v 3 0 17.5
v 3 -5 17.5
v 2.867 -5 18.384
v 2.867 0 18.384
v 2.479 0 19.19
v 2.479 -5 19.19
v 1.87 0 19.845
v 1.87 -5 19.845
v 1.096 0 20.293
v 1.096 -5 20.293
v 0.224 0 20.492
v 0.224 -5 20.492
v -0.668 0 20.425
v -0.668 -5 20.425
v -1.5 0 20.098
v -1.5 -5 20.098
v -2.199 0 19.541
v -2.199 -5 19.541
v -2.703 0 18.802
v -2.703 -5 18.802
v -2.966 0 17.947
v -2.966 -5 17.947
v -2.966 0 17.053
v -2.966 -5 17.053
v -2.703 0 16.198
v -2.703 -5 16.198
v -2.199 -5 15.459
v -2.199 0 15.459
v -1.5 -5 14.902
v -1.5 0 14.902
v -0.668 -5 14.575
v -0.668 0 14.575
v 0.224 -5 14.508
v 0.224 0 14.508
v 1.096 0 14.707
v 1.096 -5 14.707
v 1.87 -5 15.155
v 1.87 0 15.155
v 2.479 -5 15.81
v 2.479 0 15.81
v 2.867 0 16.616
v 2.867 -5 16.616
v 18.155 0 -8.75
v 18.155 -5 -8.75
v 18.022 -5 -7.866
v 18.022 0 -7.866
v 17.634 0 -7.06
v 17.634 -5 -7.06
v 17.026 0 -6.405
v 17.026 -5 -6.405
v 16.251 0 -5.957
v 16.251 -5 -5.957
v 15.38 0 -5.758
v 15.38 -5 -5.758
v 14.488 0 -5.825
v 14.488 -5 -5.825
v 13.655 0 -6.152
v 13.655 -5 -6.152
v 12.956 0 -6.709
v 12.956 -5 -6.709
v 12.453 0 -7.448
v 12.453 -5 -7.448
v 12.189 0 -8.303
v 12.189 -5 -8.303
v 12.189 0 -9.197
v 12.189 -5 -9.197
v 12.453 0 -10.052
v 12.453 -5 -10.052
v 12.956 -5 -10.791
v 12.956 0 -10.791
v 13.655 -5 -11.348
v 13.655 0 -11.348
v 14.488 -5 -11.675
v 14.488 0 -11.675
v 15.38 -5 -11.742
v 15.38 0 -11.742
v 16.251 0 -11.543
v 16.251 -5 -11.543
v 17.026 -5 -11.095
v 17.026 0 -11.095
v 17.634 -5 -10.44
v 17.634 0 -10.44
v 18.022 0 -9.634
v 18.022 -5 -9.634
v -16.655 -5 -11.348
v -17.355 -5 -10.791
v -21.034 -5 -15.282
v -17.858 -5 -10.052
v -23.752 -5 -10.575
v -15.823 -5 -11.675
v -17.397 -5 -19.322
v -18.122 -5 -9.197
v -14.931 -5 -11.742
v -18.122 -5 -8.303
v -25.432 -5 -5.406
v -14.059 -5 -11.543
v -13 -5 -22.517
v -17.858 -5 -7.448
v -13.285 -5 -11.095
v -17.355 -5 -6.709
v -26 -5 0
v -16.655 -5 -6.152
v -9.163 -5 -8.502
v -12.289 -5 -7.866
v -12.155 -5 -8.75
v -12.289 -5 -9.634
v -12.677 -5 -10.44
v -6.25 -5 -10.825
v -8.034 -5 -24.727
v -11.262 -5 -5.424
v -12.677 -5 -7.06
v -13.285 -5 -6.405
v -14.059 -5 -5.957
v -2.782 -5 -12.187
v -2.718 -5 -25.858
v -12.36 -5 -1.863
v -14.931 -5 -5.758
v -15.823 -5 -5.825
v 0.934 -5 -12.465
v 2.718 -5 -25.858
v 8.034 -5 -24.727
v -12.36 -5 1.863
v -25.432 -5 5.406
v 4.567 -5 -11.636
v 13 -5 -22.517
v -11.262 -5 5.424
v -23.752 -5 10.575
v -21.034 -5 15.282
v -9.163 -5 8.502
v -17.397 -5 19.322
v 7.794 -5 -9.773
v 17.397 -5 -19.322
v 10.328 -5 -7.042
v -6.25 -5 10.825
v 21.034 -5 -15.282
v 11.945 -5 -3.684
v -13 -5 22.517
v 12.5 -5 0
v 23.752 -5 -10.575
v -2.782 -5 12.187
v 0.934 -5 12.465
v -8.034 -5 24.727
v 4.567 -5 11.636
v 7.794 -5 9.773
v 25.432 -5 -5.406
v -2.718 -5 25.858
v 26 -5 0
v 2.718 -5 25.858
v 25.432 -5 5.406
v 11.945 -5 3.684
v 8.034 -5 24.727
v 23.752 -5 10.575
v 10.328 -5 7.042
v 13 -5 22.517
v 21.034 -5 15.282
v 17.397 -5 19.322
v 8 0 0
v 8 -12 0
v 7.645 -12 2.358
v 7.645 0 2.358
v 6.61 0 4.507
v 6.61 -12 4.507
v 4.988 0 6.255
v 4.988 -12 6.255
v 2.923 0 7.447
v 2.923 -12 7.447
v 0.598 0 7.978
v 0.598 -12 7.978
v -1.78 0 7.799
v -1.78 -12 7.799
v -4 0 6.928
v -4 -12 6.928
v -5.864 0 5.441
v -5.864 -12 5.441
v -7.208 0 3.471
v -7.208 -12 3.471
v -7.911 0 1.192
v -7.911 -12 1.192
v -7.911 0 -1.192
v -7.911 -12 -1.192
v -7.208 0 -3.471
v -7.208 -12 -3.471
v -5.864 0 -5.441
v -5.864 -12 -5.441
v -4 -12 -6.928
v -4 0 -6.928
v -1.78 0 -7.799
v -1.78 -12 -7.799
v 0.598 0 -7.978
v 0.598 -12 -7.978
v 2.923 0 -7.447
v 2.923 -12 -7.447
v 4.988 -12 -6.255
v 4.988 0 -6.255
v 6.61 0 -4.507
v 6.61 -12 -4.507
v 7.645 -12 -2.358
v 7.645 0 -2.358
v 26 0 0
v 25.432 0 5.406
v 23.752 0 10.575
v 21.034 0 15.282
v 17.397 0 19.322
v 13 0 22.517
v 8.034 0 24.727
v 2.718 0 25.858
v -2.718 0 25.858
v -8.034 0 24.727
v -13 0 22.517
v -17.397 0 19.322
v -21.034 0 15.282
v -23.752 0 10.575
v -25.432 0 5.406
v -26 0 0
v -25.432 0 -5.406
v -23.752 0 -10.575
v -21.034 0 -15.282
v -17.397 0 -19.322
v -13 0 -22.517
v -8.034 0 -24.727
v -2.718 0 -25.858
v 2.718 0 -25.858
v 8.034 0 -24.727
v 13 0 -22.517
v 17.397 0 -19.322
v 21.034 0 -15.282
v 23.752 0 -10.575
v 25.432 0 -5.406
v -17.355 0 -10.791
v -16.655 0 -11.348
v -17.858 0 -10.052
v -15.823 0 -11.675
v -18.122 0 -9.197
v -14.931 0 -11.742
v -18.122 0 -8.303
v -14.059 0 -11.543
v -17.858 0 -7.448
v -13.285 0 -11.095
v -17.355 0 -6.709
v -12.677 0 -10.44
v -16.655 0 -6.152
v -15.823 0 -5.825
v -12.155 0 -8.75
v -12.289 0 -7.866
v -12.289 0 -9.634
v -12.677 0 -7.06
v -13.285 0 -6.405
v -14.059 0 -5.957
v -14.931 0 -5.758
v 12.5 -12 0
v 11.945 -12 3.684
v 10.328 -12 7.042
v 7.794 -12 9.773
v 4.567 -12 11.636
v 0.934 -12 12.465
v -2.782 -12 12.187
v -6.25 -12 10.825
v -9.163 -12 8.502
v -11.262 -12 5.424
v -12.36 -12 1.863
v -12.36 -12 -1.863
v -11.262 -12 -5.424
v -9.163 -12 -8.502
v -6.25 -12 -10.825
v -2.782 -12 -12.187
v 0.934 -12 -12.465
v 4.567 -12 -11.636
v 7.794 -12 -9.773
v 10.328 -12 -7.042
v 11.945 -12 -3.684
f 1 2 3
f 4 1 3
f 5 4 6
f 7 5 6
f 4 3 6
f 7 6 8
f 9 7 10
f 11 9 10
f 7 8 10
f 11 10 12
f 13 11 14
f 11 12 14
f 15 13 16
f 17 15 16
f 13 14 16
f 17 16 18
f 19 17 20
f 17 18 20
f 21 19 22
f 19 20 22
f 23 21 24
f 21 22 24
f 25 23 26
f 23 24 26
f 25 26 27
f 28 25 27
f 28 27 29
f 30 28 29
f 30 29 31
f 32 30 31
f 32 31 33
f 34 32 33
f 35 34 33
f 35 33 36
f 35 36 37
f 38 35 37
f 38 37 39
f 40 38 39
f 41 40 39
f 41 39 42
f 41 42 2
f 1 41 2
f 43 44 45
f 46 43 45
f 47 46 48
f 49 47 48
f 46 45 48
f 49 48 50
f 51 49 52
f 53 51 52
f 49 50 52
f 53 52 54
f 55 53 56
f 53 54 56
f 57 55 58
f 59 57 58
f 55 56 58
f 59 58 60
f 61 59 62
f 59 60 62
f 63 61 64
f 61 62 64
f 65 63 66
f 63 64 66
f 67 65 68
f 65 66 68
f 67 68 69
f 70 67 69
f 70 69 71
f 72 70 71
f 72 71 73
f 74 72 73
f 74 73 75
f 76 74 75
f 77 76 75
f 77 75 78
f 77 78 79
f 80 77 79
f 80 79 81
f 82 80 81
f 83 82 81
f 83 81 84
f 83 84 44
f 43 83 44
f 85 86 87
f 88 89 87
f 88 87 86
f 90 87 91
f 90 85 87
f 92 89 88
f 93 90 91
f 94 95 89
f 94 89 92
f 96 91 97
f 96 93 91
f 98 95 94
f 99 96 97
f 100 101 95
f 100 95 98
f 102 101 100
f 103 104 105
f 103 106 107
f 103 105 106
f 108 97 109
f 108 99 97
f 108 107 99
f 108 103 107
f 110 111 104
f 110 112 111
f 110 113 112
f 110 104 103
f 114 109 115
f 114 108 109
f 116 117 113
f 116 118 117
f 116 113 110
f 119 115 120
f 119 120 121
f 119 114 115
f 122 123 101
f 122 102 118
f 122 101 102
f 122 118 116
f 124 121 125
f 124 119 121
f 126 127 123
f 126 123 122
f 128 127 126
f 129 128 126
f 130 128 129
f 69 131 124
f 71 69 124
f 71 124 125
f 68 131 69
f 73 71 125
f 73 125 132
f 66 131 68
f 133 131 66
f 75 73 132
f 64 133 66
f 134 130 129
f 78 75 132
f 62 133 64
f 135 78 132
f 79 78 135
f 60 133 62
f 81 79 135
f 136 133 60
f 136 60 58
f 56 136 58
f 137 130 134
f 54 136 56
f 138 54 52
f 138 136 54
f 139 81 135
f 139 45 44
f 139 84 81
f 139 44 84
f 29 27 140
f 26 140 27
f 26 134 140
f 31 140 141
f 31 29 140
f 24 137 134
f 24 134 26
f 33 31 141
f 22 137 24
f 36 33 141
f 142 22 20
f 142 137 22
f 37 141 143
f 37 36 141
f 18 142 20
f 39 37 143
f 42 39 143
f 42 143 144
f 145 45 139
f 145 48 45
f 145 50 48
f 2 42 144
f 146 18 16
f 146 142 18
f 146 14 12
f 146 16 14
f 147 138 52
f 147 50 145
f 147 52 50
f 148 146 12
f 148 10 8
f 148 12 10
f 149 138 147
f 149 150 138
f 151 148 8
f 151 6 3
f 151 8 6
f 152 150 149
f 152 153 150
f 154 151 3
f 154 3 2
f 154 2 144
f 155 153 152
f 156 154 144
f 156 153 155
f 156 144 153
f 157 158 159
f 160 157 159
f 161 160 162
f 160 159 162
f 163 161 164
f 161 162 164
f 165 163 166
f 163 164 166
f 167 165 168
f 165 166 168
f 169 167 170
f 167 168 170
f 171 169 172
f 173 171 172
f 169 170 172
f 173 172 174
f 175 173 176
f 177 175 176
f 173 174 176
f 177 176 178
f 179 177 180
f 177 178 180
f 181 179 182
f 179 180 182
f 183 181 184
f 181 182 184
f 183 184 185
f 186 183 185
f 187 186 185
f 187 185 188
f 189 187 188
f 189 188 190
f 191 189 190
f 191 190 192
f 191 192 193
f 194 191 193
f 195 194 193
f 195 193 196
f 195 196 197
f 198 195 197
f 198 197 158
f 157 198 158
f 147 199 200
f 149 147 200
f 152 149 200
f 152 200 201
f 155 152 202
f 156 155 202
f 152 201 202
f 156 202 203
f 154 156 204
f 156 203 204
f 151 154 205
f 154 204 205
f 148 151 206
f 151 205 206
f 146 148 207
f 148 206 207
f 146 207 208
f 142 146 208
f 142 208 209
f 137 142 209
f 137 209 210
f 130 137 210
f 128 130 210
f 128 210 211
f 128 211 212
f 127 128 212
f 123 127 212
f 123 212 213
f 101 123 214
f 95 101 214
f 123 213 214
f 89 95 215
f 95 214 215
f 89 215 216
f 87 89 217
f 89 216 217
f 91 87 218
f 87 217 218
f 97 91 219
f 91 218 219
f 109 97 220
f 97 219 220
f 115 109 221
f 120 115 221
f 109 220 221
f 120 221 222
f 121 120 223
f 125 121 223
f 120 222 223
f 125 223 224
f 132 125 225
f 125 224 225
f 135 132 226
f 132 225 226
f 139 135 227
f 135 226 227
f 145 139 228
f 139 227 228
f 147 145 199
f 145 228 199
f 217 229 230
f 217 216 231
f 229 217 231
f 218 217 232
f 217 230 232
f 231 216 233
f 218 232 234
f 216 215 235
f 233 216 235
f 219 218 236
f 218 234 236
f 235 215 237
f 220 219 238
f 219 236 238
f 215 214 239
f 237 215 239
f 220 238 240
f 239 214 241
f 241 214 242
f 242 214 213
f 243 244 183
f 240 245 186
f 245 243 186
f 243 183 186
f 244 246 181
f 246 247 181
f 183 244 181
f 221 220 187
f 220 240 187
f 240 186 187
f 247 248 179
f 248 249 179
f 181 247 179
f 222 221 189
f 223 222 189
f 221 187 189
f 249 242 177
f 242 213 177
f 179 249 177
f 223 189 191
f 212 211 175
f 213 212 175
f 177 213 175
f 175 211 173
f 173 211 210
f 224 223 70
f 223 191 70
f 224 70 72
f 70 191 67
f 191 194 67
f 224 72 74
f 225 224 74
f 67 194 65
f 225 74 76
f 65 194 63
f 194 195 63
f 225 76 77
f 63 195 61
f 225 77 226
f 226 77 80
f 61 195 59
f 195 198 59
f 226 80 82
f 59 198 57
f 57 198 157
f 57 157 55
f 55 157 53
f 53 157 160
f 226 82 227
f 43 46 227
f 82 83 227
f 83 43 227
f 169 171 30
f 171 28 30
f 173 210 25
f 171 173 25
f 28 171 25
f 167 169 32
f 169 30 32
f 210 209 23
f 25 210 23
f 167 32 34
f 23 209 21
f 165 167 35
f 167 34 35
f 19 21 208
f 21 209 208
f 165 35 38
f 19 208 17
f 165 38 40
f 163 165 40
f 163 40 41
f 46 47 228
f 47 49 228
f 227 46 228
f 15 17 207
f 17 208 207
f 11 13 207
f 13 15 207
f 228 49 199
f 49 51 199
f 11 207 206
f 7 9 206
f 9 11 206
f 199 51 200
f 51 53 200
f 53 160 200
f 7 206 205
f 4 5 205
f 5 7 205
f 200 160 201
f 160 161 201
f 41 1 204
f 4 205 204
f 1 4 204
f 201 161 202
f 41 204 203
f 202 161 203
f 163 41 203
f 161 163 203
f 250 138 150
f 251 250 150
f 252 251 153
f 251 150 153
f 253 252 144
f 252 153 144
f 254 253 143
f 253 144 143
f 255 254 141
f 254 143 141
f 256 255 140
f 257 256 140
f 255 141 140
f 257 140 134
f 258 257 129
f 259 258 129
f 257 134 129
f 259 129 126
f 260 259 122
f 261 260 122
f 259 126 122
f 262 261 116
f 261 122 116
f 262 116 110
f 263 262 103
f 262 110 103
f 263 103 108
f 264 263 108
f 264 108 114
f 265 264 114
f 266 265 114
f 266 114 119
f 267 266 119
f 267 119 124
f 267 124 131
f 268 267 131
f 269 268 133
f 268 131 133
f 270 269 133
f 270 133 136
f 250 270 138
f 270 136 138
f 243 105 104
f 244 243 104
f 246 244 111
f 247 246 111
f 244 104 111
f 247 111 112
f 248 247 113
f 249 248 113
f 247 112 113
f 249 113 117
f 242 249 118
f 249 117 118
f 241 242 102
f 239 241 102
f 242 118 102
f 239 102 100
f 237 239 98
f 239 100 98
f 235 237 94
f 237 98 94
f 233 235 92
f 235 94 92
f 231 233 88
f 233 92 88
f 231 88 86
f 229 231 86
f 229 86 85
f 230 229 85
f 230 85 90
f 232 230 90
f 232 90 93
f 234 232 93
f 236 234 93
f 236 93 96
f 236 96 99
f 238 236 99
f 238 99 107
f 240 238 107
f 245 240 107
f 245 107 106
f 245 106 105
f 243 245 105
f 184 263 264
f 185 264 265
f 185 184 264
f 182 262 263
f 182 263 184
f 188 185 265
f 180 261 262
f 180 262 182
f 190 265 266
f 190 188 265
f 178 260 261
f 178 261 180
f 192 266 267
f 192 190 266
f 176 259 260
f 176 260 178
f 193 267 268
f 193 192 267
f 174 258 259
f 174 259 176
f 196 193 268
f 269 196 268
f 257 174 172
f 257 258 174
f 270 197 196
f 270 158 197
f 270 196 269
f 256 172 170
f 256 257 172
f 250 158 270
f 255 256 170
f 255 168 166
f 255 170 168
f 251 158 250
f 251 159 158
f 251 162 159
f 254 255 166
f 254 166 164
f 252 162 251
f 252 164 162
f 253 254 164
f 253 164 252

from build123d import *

# Parameters (mm, degrees)
F0_R     = 26
F1_DEPTH = 5
F2_R     = 12.5
F3_DEPTH = 7
F4_R     = 3
F5_DEPTH = 25
F6_R     = 8
F7_DEPTH = 25


with BuildPart() as f1:
    # F0 (on Front) → F1 (new body)
    with BuildSketch(Plane.XZ):
        Circle(F0_R)
    extrude(amount=F1_DEPTH)

    # F2 (on face) → F3 (join)
    with BuildSketch(Plane.XZ.offset(5)):
        Circle(F2_R)
    extrude(amount=F3_DEPTH)

    # F4 (on face) → F5 (cut)
    with BuildSketch(Plane.XZ.offset(5)):
        with Locations((0, 17.5)):
            Circle(F4_R)
        with Locations((-15.155445, -8.75)):
            Circle(F4_R)
        with Locations((15.155445, -8.75)):
            Circle(F4_R)
    extrude(amount=-F5_DEPTH, mode=Mode.SUBTRACT)

    # F6 (on face) → F7 (cut)
    with BuildSketch(Plane.XZ.offset(12)):
        Circle(F6_R)
    extrude(amount=-F7_DEPTH, mode=Mode.SUBTRACT)


solid = f1.part
